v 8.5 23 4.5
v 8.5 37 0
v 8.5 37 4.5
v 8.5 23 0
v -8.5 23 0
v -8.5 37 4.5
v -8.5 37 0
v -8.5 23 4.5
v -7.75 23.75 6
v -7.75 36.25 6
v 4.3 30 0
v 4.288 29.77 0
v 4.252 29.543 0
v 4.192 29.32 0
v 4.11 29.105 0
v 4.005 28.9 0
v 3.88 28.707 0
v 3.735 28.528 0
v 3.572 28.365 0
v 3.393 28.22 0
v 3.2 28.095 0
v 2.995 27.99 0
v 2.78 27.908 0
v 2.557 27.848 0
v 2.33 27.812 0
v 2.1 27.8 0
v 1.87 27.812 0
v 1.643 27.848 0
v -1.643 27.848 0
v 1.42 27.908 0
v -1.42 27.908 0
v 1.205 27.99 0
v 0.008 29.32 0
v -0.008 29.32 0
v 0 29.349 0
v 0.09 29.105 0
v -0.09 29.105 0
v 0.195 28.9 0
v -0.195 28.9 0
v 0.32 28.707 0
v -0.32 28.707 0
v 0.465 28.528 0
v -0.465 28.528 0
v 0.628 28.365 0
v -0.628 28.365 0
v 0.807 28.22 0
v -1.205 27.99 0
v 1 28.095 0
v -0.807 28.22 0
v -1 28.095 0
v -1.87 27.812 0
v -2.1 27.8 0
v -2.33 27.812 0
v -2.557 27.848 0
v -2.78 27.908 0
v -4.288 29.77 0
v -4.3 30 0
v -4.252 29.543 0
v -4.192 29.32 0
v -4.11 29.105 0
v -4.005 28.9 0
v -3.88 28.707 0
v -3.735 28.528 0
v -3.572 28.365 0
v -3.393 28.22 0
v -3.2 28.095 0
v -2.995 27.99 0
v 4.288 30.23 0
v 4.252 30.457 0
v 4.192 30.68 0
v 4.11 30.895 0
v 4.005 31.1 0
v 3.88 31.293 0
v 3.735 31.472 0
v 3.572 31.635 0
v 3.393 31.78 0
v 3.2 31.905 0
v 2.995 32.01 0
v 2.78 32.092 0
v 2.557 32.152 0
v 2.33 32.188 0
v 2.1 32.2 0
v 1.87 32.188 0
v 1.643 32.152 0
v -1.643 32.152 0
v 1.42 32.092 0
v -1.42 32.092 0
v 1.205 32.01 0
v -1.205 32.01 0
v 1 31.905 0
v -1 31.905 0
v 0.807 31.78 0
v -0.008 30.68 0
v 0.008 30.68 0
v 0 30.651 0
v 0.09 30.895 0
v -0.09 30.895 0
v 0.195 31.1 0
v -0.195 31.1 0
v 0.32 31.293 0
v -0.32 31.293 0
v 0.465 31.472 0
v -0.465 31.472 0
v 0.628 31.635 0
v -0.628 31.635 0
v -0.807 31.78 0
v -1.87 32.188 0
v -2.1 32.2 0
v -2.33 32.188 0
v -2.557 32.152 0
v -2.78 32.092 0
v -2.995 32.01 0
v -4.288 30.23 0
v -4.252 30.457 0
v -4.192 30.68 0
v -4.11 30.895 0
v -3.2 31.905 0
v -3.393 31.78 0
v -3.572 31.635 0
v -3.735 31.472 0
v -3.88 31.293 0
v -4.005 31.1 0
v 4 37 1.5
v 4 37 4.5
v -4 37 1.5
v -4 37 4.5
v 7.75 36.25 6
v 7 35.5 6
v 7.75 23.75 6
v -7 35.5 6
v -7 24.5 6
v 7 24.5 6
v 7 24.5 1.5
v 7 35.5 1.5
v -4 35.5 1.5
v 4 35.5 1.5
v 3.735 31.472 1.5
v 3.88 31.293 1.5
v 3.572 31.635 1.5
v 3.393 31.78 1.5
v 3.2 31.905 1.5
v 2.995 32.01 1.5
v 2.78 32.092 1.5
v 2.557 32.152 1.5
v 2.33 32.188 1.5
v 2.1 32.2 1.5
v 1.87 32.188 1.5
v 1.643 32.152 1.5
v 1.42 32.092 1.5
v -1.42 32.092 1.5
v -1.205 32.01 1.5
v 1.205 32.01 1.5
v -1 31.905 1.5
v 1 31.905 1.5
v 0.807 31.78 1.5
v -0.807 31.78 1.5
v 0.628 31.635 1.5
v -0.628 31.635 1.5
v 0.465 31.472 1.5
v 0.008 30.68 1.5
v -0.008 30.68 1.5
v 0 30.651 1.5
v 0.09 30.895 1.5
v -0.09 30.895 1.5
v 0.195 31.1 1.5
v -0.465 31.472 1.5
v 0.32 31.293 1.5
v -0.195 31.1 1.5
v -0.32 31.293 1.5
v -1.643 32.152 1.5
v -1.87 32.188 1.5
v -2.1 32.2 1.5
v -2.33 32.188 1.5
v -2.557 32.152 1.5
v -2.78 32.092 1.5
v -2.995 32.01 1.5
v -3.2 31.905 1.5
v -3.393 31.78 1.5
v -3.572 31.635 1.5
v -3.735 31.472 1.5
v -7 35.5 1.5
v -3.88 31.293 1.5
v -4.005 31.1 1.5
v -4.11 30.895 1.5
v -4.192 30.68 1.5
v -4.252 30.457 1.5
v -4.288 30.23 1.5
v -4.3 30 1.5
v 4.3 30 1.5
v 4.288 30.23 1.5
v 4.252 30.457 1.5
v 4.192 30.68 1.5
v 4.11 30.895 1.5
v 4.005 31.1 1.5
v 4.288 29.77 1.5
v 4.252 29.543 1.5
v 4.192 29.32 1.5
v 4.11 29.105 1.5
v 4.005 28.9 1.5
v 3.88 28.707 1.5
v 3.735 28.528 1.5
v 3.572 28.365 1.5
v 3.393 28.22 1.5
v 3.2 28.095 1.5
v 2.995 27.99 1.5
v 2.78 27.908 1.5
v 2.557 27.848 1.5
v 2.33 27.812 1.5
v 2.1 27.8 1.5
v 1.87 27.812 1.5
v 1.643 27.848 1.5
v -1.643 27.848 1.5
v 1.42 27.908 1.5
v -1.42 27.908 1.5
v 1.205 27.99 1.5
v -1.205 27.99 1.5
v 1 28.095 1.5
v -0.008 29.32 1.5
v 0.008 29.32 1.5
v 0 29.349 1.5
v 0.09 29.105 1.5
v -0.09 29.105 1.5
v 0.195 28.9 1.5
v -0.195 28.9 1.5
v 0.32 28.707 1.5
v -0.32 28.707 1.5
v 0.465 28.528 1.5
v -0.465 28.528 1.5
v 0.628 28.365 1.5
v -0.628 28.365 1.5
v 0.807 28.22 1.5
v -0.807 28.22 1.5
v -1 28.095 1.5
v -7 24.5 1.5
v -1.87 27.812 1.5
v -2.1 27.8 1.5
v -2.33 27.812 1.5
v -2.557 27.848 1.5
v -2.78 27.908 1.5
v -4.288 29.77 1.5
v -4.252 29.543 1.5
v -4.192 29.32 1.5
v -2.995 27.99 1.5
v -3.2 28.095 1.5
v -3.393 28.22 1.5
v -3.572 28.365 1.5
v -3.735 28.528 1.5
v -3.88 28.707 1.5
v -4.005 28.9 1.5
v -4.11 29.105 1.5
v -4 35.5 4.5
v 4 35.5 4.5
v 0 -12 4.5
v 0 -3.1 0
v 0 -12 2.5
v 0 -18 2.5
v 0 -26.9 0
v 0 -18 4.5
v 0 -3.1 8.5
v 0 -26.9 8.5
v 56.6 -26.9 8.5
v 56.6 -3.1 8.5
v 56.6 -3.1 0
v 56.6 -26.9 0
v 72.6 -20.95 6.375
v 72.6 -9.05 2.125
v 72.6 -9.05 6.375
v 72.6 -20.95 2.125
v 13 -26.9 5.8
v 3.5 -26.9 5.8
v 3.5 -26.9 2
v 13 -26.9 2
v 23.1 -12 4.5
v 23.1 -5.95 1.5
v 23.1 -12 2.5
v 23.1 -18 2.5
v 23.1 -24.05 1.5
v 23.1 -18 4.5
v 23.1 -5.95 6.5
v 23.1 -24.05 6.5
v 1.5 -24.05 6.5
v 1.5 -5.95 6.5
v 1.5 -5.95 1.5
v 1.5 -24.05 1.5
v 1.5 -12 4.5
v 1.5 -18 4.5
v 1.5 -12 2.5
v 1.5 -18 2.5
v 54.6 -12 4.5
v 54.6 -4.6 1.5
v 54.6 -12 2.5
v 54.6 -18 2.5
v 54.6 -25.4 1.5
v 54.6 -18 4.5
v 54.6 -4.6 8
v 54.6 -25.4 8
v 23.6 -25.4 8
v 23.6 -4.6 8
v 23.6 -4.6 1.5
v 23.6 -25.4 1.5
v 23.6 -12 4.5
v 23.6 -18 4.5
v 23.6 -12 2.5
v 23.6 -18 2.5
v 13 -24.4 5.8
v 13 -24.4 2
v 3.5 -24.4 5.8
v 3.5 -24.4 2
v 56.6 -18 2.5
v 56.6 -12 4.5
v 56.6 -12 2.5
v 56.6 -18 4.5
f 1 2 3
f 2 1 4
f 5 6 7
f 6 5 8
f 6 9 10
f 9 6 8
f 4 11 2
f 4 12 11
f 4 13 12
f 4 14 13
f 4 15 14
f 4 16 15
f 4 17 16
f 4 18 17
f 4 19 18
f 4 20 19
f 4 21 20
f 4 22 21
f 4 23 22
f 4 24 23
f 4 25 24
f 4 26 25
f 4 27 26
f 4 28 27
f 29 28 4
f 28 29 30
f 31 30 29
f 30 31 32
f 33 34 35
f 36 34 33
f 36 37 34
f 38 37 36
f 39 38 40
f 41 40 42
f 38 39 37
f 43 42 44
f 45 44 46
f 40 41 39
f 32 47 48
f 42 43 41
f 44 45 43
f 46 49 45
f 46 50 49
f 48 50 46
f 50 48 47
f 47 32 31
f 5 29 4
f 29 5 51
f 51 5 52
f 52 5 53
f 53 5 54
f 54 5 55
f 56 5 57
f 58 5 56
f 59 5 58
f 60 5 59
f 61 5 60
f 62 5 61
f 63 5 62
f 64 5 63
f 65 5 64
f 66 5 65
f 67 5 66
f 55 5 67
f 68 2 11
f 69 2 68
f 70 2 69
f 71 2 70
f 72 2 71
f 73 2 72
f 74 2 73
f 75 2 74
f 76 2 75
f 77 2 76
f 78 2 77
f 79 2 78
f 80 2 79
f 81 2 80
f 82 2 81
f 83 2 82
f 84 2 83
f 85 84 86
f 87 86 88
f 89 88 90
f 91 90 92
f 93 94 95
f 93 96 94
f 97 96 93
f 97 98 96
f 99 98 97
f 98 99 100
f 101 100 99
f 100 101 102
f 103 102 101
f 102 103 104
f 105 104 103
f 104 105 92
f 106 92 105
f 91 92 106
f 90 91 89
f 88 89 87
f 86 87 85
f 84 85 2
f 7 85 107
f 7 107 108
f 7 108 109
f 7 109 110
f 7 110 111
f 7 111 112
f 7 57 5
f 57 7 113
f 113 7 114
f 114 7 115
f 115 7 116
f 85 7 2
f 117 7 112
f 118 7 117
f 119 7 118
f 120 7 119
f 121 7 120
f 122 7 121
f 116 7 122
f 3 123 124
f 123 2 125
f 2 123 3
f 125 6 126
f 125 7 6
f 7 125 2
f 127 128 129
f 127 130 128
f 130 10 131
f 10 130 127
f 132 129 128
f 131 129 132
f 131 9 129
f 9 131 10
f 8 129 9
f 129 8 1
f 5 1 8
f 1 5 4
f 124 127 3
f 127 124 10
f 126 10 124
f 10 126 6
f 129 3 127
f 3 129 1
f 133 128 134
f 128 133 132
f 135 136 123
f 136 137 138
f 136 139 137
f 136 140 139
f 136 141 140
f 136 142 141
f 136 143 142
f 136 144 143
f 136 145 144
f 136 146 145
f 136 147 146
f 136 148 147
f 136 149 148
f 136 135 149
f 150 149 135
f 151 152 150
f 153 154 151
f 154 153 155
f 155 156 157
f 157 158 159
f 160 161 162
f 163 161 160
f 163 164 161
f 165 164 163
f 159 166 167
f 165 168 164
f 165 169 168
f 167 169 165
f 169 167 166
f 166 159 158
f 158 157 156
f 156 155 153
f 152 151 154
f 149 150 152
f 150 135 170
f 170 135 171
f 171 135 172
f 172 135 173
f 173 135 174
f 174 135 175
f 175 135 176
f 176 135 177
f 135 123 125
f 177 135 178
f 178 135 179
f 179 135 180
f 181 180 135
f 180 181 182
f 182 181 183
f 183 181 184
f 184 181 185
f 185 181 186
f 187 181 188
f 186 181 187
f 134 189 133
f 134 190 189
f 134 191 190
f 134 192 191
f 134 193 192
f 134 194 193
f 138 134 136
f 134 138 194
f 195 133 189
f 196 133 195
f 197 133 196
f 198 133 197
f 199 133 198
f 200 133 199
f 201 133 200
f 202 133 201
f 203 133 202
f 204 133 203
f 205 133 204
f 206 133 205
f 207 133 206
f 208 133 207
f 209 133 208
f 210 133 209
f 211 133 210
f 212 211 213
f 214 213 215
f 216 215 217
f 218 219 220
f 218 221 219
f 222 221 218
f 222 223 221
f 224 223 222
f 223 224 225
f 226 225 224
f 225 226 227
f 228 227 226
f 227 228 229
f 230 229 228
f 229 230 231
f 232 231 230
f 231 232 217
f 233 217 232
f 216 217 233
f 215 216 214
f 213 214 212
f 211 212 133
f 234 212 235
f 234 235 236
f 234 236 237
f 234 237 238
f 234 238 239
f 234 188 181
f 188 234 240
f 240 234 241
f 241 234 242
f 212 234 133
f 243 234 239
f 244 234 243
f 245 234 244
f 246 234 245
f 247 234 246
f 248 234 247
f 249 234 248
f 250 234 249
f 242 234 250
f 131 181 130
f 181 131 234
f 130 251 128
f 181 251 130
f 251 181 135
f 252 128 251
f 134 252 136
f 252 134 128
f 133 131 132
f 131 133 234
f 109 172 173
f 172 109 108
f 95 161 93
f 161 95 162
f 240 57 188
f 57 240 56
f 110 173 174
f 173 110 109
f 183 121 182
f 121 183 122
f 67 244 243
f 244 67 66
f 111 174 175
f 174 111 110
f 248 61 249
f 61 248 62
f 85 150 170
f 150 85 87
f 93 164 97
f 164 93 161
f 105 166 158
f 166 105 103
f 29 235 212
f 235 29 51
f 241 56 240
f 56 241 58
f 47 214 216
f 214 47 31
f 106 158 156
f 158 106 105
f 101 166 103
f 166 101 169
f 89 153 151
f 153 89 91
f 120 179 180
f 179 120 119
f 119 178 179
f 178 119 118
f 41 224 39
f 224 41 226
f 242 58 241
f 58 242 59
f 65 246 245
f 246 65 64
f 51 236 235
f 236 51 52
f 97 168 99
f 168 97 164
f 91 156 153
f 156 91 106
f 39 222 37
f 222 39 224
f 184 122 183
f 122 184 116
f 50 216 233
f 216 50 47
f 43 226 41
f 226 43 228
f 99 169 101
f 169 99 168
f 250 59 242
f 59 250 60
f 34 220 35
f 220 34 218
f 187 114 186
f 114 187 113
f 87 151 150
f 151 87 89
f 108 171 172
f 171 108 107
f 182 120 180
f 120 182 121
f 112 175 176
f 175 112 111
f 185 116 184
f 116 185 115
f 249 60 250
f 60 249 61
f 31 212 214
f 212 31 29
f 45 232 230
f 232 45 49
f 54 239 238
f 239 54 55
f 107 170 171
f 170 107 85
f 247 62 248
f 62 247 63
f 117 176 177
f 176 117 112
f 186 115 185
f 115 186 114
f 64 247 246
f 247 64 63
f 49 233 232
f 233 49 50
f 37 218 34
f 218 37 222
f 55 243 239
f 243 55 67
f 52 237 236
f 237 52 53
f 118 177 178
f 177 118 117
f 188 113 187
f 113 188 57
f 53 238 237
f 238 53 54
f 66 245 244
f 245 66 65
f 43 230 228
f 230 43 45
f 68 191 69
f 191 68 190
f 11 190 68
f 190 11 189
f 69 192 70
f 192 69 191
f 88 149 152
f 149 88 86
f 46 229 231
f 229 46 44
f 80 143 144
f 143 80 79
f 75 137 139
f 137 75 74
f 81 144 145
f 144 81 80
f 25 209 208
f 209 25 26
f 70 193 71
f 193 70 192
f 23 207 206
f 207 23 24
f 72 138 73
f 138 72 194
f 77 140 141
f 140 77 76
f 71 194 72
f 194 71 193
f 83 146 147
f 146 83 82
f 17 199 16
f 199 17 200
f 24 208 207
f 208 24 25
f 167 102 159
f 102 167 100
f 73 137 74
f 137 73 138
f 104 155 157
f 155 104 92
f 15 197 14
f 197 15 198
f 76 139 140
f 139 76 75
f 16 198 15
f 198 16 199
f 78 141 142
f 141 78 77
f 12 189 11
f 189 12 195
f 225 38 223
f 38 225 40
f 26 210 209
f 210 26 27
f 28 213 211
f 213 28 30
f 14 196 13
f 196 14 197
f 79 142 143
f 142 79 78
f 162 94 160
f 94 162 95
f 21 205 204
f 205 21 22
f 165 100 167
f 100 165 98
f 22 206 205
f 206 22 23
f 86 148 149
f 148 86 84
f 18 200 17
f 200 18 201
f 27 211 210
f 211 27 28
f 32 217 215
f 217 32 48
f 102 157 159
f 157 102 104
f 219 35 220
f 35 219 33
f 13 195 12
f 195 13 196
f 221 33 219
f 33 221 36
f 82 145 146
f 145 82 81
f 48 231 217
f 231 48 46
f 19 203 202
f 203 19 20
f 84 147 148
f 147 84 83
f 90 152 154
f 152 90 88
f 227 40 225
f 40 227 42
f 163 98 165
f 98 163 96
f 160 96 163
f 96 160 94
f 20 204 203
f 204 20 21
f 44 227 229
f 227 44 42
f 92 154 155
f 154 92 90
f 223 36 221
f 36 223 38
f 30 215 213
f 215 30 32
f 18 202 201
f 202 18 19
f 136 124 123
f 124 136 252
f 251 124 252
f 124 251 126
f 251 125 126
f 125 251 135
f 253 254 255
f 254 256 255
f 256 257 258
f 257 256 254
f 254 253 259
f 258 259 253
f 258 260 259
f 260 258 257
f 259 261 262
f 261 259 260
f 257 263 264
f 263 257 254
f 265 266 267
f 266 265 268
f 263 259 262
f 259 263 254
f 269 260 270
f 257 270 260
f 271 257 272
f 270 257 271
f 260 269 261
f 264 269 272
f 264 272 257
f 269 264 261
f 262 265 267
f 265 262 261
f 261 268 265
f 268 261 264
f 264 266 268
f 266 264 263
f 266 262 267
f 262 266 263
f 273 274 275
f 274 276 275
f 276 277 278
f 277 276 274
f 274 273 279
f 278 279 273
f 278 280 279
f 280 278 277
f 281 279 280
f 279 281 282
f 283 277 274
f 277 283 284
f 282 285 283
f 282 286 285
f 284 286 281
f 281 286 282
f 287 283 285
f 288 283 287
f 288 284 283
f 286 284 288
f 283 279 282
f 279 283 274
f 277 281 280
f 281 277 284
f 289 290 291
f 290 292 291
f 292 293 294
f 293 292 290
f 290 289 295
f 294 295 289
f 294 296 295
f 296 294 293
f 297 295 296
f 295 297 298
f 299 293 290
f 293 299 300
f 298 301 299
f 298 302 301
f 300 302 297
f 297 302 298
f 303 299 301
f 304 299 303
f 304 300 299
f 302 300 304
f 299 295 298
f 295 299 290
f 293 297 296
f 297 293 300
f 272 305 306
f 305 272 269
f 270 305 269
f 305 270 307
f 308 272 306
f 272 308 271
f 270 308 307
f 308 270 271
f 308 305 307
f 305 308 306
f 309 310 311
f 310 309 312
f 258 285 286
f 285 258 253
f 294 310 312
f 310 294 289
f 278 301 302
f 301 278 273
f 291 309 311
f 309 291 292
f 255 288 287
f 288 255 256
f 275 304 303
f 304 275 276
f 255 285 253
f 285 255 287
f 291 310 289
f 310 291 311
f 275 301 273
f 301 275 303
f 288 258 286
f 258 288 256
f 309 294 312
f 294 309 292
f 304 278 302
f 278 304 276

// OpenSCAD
// ====================================================================
// Ain Smart Glasses - 3D Printable Parametric CAD Model (OpenSCAD)
// Model: Full Smart Frame + Modular Clip-on Kit
// Engineered for: Seeed Studio XIAO ESP32-C3 + VL53L1X ToF + 502030 LiPo
// ====================================================================

$fn = 60; // Smooth curve resolution

// --- Real Component Dimensions (in mm) with 0.4mm tolerance ---
VL53_WIDTH  = 13.5 + 0.5;
VL53_HEIGHT = 10.5 + 0.5;
VL53_THICK  = 2.6 + 0.4;
LENS_RADIUS = 2.2;
LENS_SPACING = 4.2;

XIAO_WIDTH  = 21.0 + 0.6;
XIAO_HEIGHT = 17.5 + 0.6;
XIAO_THICK  = 3.5 + 0.5;

BATTERY_LEN   = 30.0 + 1.0;
BATTERY_WIDTH = 20.0 + 0.8;
BATTERY_THICK = 5.0 + 0.5;

WALL = 1.5; // Enclosure wall thickness

// --- 1. Nose Bridge Sensor Housing (VL53L1X) ---
module sensor_bridge_mount() {
    difference() {
        // Outer case
        hull() {
            translate([- (VL53_WIDTH + WALL*2)/2, - (VL53_HEIGHT + WALL*2)/2, 0])
                cube([VL53_WIDTH + WALL*2, VL53_HEIGHT + WALL*2, VL53_THICK + WALL]);
            // Upper chamfer for aerodynamics and aesthetic
            translate([- (VL53_WIDTH + WALL)/2, - (VL53_HEIGHT + WALL)/2, VL53_THICK + WALL + 1])
                cube([VL53_WIDTH + WALL, VL53_HEIGHT + WALL, 0.5]);
        }
        
        // Inner sensor pocket
        translate([- VL53_WIDTH/2, - VL53_HEIGHT/2, WALL])
            cube([VL53_WIDTH, VL53_HEIGHT, VL53_THICK + 2]);
            
        // Dual laser emitter/receiver eyelets (Front facing)
        translate([- LENS_SPACING/2, 0, -1])
            cylinder(r = LENS_RADIUS, h = WALL + 2);
        translate([LENS_SPACING/2, 0, -1])
            cylinder(r = LENS_RADIUS, h = WALL + 2);
            
        // Top wire channel exit (for 4 silicone wires 30AWG)
        translate([-4, (VL53_HEIGHT/2), WALL])
            cube([8, WALL + 2, 3]);
    }
}

// --- 2. Temple Electronics Enclosure (Right Arm) ---
module temple_electronics_case() {
    total_len = XIAO_WIDTH + BATTERY_LEN + 4;
    case_w = max(XIAO_HEIGHT, BATTERY_WIDTH) + WALL*2;
    case_h = max(XIAO_THICK, BATTERY_THICK) + WALL*2;
    
    difference() {
        // Sleek aerodynamic outer arm housing
        hull() {
            translate([0, -case_w/2, 0])
                cube([total_len, case_w, case_h]);
            // Tapered end towards ear curve
            translate([total_len + 15, -case_w/4, case_h/4])
                cube([1, case_w/2, case_h/2]);
        }
        
        // XIAO ESP32-C3 Pocket
        translate([WALL, -XIAO_HEIGHT/2, WALL])
            cube([XIAO_WIDTH, XIAO_HEIGHT, XIAO_THICK + 1]);
            
        // LiPo 502030 Battery Pocket
        translate([XIAO_WIDTH + 2, -BATTERY_WIDTH/2, WALL])
            cube([BATTERY_LEN, BATTERY_WIDTH, BATTERY_THICK + 1]);
            
        // USB-C Charging Port Slot (Bottom facing)
        translate([WALL + 2, -case_w/2 - 1, WALL + 0.5])
            cube([9.5, WALL + 2, 3.8]);
            
        // Internal wire passway
        translate([0, -3, WALL + 1])
            cube([total_len, 6, 2]);
    }
}

// --- Render preview ---
translate([0, 30, 0]) sensor_bridge_mount();
translate([0, -15, 0]) temple_electronics_case();
